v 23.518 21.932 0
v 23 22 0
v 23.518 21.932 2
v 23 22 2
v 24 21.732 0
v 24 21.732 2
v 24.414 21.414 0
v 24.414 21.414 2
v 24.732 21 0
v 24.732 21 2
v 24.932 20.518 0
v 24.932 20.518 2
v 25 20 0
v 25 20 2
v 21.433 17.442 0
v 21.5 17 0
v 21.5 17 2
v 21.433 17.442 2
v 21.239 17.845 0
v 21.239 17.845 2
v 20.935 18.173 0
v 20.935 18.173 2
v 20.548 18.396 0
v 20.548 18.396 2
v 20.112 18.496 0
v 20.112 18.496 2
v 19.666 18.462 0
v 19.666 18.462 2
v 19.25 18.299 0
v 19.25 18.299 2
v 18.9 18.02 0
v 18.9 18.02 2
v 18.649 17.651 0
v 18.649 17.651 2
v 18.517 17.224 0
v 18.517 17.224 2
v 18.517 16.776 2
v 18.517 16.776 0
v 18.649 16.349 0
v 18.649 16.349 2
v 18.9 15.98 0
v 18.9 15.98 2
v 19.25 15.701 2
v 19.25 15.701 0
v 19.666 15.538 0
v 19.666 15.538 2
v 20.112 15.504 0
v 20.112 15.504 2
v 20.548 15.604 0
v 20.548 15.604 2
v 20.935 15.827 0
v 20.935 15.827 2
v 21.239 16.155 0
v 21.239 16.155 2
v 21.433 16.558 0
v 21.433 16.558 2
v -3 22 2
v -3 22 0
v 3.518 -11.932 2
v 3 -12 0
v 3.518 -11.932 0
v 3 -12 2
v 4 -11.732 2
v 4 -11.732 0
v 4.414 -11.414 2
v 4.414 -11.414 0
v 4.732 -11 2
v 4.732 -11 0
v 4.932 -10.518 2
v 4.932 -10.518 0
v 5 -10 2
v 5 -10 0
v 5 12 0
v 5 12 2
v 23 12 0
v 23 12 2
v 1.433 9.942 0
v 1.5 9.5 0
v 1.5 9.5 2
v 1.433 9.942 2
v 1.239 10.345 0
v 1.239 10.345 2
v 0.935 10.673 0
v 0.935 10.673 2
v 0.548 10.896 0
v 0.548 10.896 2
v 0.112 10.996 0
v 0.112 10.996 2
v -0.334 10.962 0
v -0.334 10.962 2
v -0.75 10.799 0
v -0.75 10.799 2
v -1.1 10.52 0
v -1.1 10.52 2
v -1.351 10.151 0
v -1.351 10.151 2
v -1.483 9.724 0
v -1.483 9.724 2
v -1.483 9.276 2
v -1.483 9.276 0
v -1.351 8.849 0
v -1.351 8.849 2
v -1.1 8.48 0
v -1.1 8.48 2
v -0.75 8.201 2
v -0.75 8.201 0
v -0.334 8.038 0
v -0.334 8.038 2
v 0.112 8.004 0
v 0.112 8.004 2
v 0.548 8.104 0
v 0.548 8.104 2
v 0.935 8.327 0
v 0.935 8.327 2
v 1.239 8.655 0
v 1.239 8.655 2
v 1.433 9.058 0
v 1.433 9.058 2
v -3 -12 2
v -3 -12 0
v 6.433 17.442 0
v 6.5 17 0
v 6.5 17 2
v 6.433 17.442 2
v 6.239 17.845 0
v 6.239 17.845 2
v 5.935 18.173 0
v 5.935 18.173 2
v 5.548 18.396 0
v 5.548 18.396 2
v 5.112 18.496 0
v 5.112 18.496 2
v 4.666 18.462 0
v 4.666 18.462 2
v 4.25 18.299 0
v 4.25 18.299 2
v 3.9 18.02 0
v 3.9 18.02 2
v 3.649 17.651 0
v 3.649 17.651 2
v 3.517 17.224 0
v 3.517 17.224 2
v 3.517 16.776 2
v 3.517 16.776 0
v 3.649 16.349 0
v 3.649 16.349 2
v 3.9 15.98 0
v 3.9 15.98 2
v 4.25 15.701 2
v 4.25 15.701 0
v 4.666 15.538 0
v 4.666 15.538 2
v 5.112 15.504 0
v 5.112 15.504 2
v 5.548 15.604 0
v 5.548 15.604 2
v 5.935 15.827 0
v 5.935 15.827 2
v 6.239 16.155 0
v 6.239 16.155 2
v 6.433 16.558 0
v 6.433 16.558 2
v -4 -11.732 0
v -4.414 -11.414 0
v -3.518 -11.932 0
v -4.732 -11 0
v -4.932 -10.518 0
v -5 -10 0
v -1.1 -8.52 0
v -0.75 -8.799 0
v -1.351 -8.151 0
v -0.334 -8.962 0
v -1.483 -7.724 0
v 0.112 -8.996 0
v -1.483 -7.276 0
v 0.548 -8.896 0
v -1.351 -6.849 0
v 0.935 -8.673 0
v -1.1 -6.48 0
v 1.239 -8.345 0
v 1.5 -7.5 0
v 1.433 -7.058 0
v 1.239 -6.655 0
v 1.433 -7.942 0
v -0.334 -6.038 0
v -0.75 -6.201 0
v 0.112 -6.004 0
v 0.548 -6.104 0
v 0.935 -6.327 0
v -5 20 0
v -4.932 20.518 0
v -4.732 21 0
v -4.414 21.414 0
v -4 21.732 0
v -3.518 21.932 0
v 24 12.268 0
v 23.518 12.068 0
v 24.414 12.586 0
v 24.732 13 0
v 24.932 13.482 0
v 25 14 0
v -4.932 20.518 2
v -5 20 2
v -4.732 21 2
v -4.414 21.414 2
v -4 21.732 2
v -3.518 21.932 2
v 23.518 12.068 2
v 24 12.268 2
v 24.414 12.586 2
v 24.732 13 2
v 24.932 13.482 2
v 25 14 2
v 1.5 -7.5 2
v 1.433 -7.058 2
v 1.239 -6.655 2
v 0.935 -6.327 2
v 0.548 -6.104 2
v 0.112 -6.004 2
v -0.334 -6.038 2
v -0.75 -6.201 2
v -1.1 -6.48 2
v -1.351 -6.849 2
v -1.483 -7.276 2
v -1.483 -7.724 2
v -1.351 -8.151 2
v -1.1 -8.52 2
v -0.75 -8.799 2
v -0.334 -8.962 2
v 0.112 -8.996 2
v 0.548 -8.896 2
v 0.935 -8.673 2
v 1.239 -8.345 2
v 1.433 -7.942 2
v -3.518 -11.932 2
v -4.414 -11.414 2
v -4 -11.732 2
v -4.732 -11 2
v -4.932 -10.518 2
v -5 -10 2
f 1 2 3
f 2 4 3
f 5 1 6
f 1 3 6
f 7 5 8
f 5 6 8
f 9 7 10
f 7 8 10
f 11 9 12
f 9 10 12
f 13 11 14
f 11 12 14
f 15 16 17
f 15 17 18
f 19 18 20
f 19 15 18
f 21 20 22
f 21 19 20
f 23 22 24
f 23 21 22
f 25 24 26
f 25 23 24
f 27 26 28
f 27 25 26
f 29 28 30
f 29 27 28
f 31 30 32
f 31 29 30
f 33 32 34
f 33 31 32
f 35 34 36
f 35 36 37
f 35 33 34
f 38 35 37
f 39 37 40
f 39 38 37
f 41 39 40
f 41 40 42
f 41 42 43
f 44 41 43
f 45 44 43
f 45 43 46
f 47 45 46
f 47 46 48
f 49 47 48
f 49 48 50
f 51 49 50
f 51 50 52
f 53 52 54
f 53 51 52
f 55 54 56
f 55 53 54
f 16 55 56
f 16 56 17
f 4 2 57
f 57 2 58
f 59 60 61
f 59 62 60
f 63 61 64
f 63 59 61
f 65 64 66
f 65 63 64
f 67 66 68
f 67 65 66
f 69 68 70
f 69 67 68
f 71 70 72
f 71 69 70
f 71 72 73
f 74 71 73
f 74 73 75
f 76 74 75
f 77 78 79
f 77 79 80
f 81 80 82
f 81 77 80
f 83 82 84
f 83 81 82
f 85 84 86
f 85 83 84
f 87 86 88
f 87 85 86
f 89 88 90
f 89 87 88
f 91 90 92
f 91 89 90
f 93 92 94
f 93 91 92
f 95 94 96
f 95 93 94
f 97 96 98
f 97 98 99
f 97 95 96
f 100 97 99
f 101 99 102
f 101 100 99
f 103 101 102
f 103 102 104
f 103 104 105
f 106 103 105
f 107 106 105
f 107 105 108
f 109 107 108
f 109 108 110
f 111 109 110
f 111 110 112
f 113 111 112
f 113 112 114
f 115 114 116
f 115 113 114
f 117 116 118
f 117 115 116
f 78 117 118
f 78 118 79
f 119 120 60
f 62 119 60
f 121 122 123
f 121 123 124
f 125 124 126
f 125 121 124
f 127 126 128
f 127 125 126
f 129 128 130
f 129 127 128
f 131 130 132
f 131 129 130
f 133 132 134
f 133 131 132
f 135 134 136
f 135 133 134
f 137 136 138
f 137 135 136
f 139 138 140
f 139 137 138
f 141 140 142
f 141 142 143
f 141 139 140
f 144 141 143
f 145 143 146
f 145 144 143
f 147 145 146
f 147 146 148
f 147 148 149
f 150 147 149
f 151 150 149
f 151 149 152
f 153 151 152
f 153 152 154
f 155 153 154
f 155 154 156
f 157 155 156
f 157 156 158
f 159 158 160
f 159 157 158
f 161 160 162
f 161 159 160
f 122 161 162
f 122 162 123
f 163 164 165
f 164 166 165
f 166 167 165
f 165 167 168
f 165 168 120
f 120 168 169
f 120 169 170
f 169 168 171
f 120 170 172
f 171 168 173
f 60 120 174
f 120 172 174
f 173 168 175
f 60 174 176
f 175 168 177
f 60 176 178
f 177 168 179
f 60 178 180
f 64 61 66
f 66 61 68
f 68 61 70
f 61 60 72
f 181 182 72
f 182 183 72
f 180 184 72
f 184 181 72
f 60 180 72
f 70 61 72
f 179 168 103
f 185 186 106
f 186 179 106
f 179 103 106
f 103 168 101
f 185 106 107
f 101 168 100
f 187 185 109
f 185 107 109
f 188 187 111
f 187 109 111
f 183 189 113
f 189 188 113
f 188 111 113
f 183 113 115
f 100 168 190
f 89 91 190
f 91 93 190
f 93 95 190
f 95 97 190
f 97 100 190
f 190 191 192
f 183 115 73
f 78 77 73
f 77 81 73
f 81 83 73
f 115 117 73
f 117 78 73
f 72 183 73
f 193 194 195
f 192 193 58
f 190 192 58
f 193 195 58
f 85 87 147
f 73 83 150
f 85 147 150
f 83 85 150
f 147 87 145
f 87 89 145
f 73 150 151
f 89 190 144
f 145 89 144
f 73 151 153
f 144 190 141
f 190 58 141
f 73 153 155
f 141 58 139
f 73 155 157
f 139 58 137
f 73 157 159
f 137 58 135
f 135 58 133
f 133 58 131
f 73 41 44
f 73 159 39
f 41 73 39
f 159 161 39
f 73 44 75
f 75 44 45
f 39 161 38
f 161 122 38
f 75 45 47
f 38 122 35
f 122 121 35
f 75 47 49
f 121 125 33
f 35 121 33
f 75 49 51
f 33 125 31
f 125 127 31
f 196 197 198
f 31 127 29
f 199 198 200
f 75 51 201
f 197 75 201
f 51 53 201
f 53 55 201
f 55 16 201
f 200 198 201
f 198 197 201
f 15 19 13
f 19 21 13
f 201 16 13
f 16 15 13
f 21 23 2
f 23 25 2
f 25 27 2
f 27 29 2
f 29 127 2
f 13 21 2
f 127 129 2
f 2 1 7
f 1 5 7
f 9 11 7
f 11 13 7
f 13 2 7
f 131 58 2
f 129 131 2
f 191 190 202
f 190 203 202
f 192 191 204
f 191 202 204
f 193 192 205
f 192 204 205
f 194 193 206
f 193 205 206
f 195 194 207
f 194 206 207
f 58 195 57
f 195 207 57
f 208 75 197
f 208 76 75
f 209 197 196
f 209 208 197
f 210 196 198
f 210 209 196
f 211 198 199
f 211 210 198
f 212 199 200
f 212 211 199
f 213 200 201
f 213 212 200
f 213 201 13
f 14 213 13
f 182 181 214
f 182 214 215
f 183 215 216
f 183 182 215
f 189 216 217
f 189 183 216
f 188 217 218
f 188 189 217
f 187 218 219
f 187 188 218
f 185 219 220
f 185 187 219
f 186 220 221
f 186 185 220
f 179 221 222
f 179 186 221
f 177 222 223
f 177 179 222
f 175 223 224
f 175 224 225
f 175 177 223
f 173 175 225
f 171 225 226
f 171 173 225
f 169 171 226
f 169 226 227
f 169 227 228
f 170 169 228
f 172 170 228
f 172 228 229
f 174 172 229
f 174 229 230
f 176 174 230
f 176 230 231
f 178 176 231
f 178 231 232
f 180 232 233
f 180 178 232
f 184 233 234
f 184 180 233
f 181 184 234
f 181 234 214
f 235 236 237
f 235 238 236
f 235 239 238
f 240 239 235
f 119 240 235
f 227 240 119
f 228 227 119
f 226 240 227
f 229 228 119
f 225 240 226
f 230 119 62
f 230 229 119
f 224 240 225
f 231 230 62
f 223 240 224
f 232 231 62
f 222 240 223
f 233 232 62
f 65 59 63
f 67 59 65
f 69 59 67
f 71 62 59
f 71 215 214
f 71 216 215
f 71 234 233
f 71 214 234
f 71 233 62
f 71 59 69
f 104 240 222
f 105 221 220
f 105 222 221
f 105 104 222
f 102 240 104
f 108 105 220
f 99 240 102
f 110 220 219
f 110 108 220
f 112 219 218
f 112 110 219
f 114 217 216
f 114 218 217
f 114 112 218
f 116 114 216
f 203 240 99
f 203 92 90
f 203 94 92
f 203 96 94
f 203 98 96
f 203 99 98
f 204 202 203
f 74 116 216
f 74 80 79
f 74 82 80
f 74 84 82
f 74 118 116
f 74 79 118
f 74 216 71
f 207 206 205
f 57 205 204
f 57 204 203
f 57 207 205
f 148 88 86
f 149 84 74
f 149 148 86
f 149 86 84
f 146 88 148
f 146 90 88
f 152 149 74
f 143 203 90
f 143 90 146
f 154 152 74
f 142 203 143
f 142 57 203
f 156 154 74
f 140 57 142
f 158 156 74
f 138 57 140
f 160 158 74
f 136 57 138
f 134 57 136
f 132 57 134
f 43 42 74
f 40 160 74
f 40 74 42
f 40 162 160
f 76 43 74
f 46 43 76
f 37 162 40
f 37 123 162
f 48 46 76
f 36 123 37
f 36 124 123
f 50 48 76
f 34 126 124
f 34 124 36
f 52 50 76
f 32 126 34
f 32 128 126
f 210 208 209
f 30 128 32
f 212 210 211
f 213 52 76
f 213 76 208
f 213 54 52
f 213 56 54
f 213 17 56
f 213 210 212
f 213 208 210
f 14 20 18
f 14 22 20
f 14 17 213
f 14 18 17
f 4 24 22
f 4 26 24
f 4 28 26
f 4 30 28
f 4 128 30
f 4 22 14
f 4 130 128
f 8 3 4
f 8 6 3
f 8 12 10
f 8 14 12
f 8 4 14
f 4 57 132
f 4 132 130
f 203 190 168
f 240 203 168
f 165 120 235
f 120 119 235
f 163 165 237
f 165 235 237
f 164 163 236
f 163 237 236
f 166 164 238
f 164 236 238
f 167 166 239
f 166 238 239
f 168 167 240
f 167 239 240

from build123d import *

# Parameters (mm, degrees)
SKETCH1_R           = 1.5
BOSS_EXTRUDE1_DEPTH = 2
FILLET1_R           = 2


with BuildPart() as part:
    # Sketch1 → Boss-Extrude1 (new body)
    with BuildSketch(Plane.XY):
        Polygon((-5, 12), (-5, -12), (5, -12), (5, 12), (25, 12), (25, 22), (-5, 22), align=None)
        with Locations((0, 9.5)):
            Circle(SKETCH1_R, mode=Mode.SUBTRACT)
        with Locations((0, -7.5)):
            Circle(SKETCH1_R, mode=Mode.SUBTRACT)
        with Locations((5, 17)):
            Circle(SKETCH1_R, mode=Mode.SUBTRACT)
        with Locations((20, 17)):
            Circle(SKETCH1_R, mode=Mode.SUBTRACT)
    extrude(amount=BOSS_EXTRUDE1_DEPTH)

    # Fillet1
    fillet1_edges = [part.edges().sort_by_distance(p)[0] for p in [
        (5, -12, 1),
        (-5, -12, 1),
        (-5, 22, 1),
        (25, 22, 1),
        (25, 12, 1),
    ]]
    fillet(fillet1_edges, radius=FILLET1_R)


solid = part.part
